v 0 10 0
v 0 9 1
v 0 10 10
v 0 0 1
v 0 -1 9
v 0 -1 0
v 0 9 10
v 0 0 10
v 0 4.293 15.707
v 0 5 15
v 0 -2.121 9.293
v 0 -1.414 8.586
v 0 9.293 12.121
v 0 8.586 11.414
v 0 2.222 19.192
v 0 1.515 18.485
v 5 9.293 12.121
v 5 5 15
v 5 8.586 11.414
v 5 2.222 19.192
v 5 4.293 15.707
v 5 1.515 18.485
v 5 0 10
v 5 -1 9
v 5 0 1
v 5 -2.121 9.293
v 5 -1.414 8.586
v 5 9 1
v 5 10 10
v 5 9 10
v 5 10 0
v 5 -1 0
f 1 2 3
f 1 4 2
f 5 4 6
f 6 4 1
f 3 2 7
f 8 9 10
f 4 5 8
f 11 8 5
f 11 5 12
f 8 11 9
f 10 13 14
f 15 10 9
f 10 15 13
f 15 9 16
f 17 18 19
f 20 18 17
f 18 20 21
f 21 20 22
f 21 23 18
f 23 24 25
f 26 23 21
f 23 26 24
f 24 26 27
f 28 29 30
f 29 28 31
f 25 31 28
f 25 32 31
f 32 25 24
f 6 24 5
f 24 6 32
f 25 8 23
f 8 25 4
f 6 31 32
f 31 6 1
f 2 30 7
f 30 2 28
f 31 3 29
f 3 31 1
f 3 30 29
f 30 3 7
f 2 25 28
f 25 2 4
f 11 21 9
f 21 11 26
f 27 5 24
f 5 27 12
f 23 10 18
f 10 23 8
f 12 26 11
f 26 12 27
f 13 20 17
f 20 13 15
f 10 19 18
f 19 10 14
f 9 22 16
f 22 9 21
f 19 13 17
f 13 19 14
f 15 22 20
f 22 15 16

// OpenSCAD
myWord =5;

mySecondVariable = myWord*2;
myFudgeVarable = 2;

echo(myWord);

echo(mySecondVariable);



translate([0,0,0]){
	rotate([90,0,0]){
		cube([myWord,mySecondVariable,1]);
	}
}

translate([0,mySecondVariable,0]){
	rotate([90,0,0]){
		cube([myWord,mySecondVariable,1]);
	}
}

translate([0,0,0]){
	rotate([0,0,0]){
		
		cube([myWord,mySecondVariable,1]);
	}
}


translate([0,0,mySecondVariable]){
	rotate([45,0,0]){
		translate([0,-myFudgeVarable,0]){
			cube([myWord,mySecondVariable,1]);						}
		
	}
}

translate([0,mySecondVariable,mySecondVariable]){
	rotate([-45,0,0]){
		translate([0,-(mySecondVariable+myFudgeVarable),0]){
			cube([myWord,mySecondVariable,1]);						}
		
	}
}
